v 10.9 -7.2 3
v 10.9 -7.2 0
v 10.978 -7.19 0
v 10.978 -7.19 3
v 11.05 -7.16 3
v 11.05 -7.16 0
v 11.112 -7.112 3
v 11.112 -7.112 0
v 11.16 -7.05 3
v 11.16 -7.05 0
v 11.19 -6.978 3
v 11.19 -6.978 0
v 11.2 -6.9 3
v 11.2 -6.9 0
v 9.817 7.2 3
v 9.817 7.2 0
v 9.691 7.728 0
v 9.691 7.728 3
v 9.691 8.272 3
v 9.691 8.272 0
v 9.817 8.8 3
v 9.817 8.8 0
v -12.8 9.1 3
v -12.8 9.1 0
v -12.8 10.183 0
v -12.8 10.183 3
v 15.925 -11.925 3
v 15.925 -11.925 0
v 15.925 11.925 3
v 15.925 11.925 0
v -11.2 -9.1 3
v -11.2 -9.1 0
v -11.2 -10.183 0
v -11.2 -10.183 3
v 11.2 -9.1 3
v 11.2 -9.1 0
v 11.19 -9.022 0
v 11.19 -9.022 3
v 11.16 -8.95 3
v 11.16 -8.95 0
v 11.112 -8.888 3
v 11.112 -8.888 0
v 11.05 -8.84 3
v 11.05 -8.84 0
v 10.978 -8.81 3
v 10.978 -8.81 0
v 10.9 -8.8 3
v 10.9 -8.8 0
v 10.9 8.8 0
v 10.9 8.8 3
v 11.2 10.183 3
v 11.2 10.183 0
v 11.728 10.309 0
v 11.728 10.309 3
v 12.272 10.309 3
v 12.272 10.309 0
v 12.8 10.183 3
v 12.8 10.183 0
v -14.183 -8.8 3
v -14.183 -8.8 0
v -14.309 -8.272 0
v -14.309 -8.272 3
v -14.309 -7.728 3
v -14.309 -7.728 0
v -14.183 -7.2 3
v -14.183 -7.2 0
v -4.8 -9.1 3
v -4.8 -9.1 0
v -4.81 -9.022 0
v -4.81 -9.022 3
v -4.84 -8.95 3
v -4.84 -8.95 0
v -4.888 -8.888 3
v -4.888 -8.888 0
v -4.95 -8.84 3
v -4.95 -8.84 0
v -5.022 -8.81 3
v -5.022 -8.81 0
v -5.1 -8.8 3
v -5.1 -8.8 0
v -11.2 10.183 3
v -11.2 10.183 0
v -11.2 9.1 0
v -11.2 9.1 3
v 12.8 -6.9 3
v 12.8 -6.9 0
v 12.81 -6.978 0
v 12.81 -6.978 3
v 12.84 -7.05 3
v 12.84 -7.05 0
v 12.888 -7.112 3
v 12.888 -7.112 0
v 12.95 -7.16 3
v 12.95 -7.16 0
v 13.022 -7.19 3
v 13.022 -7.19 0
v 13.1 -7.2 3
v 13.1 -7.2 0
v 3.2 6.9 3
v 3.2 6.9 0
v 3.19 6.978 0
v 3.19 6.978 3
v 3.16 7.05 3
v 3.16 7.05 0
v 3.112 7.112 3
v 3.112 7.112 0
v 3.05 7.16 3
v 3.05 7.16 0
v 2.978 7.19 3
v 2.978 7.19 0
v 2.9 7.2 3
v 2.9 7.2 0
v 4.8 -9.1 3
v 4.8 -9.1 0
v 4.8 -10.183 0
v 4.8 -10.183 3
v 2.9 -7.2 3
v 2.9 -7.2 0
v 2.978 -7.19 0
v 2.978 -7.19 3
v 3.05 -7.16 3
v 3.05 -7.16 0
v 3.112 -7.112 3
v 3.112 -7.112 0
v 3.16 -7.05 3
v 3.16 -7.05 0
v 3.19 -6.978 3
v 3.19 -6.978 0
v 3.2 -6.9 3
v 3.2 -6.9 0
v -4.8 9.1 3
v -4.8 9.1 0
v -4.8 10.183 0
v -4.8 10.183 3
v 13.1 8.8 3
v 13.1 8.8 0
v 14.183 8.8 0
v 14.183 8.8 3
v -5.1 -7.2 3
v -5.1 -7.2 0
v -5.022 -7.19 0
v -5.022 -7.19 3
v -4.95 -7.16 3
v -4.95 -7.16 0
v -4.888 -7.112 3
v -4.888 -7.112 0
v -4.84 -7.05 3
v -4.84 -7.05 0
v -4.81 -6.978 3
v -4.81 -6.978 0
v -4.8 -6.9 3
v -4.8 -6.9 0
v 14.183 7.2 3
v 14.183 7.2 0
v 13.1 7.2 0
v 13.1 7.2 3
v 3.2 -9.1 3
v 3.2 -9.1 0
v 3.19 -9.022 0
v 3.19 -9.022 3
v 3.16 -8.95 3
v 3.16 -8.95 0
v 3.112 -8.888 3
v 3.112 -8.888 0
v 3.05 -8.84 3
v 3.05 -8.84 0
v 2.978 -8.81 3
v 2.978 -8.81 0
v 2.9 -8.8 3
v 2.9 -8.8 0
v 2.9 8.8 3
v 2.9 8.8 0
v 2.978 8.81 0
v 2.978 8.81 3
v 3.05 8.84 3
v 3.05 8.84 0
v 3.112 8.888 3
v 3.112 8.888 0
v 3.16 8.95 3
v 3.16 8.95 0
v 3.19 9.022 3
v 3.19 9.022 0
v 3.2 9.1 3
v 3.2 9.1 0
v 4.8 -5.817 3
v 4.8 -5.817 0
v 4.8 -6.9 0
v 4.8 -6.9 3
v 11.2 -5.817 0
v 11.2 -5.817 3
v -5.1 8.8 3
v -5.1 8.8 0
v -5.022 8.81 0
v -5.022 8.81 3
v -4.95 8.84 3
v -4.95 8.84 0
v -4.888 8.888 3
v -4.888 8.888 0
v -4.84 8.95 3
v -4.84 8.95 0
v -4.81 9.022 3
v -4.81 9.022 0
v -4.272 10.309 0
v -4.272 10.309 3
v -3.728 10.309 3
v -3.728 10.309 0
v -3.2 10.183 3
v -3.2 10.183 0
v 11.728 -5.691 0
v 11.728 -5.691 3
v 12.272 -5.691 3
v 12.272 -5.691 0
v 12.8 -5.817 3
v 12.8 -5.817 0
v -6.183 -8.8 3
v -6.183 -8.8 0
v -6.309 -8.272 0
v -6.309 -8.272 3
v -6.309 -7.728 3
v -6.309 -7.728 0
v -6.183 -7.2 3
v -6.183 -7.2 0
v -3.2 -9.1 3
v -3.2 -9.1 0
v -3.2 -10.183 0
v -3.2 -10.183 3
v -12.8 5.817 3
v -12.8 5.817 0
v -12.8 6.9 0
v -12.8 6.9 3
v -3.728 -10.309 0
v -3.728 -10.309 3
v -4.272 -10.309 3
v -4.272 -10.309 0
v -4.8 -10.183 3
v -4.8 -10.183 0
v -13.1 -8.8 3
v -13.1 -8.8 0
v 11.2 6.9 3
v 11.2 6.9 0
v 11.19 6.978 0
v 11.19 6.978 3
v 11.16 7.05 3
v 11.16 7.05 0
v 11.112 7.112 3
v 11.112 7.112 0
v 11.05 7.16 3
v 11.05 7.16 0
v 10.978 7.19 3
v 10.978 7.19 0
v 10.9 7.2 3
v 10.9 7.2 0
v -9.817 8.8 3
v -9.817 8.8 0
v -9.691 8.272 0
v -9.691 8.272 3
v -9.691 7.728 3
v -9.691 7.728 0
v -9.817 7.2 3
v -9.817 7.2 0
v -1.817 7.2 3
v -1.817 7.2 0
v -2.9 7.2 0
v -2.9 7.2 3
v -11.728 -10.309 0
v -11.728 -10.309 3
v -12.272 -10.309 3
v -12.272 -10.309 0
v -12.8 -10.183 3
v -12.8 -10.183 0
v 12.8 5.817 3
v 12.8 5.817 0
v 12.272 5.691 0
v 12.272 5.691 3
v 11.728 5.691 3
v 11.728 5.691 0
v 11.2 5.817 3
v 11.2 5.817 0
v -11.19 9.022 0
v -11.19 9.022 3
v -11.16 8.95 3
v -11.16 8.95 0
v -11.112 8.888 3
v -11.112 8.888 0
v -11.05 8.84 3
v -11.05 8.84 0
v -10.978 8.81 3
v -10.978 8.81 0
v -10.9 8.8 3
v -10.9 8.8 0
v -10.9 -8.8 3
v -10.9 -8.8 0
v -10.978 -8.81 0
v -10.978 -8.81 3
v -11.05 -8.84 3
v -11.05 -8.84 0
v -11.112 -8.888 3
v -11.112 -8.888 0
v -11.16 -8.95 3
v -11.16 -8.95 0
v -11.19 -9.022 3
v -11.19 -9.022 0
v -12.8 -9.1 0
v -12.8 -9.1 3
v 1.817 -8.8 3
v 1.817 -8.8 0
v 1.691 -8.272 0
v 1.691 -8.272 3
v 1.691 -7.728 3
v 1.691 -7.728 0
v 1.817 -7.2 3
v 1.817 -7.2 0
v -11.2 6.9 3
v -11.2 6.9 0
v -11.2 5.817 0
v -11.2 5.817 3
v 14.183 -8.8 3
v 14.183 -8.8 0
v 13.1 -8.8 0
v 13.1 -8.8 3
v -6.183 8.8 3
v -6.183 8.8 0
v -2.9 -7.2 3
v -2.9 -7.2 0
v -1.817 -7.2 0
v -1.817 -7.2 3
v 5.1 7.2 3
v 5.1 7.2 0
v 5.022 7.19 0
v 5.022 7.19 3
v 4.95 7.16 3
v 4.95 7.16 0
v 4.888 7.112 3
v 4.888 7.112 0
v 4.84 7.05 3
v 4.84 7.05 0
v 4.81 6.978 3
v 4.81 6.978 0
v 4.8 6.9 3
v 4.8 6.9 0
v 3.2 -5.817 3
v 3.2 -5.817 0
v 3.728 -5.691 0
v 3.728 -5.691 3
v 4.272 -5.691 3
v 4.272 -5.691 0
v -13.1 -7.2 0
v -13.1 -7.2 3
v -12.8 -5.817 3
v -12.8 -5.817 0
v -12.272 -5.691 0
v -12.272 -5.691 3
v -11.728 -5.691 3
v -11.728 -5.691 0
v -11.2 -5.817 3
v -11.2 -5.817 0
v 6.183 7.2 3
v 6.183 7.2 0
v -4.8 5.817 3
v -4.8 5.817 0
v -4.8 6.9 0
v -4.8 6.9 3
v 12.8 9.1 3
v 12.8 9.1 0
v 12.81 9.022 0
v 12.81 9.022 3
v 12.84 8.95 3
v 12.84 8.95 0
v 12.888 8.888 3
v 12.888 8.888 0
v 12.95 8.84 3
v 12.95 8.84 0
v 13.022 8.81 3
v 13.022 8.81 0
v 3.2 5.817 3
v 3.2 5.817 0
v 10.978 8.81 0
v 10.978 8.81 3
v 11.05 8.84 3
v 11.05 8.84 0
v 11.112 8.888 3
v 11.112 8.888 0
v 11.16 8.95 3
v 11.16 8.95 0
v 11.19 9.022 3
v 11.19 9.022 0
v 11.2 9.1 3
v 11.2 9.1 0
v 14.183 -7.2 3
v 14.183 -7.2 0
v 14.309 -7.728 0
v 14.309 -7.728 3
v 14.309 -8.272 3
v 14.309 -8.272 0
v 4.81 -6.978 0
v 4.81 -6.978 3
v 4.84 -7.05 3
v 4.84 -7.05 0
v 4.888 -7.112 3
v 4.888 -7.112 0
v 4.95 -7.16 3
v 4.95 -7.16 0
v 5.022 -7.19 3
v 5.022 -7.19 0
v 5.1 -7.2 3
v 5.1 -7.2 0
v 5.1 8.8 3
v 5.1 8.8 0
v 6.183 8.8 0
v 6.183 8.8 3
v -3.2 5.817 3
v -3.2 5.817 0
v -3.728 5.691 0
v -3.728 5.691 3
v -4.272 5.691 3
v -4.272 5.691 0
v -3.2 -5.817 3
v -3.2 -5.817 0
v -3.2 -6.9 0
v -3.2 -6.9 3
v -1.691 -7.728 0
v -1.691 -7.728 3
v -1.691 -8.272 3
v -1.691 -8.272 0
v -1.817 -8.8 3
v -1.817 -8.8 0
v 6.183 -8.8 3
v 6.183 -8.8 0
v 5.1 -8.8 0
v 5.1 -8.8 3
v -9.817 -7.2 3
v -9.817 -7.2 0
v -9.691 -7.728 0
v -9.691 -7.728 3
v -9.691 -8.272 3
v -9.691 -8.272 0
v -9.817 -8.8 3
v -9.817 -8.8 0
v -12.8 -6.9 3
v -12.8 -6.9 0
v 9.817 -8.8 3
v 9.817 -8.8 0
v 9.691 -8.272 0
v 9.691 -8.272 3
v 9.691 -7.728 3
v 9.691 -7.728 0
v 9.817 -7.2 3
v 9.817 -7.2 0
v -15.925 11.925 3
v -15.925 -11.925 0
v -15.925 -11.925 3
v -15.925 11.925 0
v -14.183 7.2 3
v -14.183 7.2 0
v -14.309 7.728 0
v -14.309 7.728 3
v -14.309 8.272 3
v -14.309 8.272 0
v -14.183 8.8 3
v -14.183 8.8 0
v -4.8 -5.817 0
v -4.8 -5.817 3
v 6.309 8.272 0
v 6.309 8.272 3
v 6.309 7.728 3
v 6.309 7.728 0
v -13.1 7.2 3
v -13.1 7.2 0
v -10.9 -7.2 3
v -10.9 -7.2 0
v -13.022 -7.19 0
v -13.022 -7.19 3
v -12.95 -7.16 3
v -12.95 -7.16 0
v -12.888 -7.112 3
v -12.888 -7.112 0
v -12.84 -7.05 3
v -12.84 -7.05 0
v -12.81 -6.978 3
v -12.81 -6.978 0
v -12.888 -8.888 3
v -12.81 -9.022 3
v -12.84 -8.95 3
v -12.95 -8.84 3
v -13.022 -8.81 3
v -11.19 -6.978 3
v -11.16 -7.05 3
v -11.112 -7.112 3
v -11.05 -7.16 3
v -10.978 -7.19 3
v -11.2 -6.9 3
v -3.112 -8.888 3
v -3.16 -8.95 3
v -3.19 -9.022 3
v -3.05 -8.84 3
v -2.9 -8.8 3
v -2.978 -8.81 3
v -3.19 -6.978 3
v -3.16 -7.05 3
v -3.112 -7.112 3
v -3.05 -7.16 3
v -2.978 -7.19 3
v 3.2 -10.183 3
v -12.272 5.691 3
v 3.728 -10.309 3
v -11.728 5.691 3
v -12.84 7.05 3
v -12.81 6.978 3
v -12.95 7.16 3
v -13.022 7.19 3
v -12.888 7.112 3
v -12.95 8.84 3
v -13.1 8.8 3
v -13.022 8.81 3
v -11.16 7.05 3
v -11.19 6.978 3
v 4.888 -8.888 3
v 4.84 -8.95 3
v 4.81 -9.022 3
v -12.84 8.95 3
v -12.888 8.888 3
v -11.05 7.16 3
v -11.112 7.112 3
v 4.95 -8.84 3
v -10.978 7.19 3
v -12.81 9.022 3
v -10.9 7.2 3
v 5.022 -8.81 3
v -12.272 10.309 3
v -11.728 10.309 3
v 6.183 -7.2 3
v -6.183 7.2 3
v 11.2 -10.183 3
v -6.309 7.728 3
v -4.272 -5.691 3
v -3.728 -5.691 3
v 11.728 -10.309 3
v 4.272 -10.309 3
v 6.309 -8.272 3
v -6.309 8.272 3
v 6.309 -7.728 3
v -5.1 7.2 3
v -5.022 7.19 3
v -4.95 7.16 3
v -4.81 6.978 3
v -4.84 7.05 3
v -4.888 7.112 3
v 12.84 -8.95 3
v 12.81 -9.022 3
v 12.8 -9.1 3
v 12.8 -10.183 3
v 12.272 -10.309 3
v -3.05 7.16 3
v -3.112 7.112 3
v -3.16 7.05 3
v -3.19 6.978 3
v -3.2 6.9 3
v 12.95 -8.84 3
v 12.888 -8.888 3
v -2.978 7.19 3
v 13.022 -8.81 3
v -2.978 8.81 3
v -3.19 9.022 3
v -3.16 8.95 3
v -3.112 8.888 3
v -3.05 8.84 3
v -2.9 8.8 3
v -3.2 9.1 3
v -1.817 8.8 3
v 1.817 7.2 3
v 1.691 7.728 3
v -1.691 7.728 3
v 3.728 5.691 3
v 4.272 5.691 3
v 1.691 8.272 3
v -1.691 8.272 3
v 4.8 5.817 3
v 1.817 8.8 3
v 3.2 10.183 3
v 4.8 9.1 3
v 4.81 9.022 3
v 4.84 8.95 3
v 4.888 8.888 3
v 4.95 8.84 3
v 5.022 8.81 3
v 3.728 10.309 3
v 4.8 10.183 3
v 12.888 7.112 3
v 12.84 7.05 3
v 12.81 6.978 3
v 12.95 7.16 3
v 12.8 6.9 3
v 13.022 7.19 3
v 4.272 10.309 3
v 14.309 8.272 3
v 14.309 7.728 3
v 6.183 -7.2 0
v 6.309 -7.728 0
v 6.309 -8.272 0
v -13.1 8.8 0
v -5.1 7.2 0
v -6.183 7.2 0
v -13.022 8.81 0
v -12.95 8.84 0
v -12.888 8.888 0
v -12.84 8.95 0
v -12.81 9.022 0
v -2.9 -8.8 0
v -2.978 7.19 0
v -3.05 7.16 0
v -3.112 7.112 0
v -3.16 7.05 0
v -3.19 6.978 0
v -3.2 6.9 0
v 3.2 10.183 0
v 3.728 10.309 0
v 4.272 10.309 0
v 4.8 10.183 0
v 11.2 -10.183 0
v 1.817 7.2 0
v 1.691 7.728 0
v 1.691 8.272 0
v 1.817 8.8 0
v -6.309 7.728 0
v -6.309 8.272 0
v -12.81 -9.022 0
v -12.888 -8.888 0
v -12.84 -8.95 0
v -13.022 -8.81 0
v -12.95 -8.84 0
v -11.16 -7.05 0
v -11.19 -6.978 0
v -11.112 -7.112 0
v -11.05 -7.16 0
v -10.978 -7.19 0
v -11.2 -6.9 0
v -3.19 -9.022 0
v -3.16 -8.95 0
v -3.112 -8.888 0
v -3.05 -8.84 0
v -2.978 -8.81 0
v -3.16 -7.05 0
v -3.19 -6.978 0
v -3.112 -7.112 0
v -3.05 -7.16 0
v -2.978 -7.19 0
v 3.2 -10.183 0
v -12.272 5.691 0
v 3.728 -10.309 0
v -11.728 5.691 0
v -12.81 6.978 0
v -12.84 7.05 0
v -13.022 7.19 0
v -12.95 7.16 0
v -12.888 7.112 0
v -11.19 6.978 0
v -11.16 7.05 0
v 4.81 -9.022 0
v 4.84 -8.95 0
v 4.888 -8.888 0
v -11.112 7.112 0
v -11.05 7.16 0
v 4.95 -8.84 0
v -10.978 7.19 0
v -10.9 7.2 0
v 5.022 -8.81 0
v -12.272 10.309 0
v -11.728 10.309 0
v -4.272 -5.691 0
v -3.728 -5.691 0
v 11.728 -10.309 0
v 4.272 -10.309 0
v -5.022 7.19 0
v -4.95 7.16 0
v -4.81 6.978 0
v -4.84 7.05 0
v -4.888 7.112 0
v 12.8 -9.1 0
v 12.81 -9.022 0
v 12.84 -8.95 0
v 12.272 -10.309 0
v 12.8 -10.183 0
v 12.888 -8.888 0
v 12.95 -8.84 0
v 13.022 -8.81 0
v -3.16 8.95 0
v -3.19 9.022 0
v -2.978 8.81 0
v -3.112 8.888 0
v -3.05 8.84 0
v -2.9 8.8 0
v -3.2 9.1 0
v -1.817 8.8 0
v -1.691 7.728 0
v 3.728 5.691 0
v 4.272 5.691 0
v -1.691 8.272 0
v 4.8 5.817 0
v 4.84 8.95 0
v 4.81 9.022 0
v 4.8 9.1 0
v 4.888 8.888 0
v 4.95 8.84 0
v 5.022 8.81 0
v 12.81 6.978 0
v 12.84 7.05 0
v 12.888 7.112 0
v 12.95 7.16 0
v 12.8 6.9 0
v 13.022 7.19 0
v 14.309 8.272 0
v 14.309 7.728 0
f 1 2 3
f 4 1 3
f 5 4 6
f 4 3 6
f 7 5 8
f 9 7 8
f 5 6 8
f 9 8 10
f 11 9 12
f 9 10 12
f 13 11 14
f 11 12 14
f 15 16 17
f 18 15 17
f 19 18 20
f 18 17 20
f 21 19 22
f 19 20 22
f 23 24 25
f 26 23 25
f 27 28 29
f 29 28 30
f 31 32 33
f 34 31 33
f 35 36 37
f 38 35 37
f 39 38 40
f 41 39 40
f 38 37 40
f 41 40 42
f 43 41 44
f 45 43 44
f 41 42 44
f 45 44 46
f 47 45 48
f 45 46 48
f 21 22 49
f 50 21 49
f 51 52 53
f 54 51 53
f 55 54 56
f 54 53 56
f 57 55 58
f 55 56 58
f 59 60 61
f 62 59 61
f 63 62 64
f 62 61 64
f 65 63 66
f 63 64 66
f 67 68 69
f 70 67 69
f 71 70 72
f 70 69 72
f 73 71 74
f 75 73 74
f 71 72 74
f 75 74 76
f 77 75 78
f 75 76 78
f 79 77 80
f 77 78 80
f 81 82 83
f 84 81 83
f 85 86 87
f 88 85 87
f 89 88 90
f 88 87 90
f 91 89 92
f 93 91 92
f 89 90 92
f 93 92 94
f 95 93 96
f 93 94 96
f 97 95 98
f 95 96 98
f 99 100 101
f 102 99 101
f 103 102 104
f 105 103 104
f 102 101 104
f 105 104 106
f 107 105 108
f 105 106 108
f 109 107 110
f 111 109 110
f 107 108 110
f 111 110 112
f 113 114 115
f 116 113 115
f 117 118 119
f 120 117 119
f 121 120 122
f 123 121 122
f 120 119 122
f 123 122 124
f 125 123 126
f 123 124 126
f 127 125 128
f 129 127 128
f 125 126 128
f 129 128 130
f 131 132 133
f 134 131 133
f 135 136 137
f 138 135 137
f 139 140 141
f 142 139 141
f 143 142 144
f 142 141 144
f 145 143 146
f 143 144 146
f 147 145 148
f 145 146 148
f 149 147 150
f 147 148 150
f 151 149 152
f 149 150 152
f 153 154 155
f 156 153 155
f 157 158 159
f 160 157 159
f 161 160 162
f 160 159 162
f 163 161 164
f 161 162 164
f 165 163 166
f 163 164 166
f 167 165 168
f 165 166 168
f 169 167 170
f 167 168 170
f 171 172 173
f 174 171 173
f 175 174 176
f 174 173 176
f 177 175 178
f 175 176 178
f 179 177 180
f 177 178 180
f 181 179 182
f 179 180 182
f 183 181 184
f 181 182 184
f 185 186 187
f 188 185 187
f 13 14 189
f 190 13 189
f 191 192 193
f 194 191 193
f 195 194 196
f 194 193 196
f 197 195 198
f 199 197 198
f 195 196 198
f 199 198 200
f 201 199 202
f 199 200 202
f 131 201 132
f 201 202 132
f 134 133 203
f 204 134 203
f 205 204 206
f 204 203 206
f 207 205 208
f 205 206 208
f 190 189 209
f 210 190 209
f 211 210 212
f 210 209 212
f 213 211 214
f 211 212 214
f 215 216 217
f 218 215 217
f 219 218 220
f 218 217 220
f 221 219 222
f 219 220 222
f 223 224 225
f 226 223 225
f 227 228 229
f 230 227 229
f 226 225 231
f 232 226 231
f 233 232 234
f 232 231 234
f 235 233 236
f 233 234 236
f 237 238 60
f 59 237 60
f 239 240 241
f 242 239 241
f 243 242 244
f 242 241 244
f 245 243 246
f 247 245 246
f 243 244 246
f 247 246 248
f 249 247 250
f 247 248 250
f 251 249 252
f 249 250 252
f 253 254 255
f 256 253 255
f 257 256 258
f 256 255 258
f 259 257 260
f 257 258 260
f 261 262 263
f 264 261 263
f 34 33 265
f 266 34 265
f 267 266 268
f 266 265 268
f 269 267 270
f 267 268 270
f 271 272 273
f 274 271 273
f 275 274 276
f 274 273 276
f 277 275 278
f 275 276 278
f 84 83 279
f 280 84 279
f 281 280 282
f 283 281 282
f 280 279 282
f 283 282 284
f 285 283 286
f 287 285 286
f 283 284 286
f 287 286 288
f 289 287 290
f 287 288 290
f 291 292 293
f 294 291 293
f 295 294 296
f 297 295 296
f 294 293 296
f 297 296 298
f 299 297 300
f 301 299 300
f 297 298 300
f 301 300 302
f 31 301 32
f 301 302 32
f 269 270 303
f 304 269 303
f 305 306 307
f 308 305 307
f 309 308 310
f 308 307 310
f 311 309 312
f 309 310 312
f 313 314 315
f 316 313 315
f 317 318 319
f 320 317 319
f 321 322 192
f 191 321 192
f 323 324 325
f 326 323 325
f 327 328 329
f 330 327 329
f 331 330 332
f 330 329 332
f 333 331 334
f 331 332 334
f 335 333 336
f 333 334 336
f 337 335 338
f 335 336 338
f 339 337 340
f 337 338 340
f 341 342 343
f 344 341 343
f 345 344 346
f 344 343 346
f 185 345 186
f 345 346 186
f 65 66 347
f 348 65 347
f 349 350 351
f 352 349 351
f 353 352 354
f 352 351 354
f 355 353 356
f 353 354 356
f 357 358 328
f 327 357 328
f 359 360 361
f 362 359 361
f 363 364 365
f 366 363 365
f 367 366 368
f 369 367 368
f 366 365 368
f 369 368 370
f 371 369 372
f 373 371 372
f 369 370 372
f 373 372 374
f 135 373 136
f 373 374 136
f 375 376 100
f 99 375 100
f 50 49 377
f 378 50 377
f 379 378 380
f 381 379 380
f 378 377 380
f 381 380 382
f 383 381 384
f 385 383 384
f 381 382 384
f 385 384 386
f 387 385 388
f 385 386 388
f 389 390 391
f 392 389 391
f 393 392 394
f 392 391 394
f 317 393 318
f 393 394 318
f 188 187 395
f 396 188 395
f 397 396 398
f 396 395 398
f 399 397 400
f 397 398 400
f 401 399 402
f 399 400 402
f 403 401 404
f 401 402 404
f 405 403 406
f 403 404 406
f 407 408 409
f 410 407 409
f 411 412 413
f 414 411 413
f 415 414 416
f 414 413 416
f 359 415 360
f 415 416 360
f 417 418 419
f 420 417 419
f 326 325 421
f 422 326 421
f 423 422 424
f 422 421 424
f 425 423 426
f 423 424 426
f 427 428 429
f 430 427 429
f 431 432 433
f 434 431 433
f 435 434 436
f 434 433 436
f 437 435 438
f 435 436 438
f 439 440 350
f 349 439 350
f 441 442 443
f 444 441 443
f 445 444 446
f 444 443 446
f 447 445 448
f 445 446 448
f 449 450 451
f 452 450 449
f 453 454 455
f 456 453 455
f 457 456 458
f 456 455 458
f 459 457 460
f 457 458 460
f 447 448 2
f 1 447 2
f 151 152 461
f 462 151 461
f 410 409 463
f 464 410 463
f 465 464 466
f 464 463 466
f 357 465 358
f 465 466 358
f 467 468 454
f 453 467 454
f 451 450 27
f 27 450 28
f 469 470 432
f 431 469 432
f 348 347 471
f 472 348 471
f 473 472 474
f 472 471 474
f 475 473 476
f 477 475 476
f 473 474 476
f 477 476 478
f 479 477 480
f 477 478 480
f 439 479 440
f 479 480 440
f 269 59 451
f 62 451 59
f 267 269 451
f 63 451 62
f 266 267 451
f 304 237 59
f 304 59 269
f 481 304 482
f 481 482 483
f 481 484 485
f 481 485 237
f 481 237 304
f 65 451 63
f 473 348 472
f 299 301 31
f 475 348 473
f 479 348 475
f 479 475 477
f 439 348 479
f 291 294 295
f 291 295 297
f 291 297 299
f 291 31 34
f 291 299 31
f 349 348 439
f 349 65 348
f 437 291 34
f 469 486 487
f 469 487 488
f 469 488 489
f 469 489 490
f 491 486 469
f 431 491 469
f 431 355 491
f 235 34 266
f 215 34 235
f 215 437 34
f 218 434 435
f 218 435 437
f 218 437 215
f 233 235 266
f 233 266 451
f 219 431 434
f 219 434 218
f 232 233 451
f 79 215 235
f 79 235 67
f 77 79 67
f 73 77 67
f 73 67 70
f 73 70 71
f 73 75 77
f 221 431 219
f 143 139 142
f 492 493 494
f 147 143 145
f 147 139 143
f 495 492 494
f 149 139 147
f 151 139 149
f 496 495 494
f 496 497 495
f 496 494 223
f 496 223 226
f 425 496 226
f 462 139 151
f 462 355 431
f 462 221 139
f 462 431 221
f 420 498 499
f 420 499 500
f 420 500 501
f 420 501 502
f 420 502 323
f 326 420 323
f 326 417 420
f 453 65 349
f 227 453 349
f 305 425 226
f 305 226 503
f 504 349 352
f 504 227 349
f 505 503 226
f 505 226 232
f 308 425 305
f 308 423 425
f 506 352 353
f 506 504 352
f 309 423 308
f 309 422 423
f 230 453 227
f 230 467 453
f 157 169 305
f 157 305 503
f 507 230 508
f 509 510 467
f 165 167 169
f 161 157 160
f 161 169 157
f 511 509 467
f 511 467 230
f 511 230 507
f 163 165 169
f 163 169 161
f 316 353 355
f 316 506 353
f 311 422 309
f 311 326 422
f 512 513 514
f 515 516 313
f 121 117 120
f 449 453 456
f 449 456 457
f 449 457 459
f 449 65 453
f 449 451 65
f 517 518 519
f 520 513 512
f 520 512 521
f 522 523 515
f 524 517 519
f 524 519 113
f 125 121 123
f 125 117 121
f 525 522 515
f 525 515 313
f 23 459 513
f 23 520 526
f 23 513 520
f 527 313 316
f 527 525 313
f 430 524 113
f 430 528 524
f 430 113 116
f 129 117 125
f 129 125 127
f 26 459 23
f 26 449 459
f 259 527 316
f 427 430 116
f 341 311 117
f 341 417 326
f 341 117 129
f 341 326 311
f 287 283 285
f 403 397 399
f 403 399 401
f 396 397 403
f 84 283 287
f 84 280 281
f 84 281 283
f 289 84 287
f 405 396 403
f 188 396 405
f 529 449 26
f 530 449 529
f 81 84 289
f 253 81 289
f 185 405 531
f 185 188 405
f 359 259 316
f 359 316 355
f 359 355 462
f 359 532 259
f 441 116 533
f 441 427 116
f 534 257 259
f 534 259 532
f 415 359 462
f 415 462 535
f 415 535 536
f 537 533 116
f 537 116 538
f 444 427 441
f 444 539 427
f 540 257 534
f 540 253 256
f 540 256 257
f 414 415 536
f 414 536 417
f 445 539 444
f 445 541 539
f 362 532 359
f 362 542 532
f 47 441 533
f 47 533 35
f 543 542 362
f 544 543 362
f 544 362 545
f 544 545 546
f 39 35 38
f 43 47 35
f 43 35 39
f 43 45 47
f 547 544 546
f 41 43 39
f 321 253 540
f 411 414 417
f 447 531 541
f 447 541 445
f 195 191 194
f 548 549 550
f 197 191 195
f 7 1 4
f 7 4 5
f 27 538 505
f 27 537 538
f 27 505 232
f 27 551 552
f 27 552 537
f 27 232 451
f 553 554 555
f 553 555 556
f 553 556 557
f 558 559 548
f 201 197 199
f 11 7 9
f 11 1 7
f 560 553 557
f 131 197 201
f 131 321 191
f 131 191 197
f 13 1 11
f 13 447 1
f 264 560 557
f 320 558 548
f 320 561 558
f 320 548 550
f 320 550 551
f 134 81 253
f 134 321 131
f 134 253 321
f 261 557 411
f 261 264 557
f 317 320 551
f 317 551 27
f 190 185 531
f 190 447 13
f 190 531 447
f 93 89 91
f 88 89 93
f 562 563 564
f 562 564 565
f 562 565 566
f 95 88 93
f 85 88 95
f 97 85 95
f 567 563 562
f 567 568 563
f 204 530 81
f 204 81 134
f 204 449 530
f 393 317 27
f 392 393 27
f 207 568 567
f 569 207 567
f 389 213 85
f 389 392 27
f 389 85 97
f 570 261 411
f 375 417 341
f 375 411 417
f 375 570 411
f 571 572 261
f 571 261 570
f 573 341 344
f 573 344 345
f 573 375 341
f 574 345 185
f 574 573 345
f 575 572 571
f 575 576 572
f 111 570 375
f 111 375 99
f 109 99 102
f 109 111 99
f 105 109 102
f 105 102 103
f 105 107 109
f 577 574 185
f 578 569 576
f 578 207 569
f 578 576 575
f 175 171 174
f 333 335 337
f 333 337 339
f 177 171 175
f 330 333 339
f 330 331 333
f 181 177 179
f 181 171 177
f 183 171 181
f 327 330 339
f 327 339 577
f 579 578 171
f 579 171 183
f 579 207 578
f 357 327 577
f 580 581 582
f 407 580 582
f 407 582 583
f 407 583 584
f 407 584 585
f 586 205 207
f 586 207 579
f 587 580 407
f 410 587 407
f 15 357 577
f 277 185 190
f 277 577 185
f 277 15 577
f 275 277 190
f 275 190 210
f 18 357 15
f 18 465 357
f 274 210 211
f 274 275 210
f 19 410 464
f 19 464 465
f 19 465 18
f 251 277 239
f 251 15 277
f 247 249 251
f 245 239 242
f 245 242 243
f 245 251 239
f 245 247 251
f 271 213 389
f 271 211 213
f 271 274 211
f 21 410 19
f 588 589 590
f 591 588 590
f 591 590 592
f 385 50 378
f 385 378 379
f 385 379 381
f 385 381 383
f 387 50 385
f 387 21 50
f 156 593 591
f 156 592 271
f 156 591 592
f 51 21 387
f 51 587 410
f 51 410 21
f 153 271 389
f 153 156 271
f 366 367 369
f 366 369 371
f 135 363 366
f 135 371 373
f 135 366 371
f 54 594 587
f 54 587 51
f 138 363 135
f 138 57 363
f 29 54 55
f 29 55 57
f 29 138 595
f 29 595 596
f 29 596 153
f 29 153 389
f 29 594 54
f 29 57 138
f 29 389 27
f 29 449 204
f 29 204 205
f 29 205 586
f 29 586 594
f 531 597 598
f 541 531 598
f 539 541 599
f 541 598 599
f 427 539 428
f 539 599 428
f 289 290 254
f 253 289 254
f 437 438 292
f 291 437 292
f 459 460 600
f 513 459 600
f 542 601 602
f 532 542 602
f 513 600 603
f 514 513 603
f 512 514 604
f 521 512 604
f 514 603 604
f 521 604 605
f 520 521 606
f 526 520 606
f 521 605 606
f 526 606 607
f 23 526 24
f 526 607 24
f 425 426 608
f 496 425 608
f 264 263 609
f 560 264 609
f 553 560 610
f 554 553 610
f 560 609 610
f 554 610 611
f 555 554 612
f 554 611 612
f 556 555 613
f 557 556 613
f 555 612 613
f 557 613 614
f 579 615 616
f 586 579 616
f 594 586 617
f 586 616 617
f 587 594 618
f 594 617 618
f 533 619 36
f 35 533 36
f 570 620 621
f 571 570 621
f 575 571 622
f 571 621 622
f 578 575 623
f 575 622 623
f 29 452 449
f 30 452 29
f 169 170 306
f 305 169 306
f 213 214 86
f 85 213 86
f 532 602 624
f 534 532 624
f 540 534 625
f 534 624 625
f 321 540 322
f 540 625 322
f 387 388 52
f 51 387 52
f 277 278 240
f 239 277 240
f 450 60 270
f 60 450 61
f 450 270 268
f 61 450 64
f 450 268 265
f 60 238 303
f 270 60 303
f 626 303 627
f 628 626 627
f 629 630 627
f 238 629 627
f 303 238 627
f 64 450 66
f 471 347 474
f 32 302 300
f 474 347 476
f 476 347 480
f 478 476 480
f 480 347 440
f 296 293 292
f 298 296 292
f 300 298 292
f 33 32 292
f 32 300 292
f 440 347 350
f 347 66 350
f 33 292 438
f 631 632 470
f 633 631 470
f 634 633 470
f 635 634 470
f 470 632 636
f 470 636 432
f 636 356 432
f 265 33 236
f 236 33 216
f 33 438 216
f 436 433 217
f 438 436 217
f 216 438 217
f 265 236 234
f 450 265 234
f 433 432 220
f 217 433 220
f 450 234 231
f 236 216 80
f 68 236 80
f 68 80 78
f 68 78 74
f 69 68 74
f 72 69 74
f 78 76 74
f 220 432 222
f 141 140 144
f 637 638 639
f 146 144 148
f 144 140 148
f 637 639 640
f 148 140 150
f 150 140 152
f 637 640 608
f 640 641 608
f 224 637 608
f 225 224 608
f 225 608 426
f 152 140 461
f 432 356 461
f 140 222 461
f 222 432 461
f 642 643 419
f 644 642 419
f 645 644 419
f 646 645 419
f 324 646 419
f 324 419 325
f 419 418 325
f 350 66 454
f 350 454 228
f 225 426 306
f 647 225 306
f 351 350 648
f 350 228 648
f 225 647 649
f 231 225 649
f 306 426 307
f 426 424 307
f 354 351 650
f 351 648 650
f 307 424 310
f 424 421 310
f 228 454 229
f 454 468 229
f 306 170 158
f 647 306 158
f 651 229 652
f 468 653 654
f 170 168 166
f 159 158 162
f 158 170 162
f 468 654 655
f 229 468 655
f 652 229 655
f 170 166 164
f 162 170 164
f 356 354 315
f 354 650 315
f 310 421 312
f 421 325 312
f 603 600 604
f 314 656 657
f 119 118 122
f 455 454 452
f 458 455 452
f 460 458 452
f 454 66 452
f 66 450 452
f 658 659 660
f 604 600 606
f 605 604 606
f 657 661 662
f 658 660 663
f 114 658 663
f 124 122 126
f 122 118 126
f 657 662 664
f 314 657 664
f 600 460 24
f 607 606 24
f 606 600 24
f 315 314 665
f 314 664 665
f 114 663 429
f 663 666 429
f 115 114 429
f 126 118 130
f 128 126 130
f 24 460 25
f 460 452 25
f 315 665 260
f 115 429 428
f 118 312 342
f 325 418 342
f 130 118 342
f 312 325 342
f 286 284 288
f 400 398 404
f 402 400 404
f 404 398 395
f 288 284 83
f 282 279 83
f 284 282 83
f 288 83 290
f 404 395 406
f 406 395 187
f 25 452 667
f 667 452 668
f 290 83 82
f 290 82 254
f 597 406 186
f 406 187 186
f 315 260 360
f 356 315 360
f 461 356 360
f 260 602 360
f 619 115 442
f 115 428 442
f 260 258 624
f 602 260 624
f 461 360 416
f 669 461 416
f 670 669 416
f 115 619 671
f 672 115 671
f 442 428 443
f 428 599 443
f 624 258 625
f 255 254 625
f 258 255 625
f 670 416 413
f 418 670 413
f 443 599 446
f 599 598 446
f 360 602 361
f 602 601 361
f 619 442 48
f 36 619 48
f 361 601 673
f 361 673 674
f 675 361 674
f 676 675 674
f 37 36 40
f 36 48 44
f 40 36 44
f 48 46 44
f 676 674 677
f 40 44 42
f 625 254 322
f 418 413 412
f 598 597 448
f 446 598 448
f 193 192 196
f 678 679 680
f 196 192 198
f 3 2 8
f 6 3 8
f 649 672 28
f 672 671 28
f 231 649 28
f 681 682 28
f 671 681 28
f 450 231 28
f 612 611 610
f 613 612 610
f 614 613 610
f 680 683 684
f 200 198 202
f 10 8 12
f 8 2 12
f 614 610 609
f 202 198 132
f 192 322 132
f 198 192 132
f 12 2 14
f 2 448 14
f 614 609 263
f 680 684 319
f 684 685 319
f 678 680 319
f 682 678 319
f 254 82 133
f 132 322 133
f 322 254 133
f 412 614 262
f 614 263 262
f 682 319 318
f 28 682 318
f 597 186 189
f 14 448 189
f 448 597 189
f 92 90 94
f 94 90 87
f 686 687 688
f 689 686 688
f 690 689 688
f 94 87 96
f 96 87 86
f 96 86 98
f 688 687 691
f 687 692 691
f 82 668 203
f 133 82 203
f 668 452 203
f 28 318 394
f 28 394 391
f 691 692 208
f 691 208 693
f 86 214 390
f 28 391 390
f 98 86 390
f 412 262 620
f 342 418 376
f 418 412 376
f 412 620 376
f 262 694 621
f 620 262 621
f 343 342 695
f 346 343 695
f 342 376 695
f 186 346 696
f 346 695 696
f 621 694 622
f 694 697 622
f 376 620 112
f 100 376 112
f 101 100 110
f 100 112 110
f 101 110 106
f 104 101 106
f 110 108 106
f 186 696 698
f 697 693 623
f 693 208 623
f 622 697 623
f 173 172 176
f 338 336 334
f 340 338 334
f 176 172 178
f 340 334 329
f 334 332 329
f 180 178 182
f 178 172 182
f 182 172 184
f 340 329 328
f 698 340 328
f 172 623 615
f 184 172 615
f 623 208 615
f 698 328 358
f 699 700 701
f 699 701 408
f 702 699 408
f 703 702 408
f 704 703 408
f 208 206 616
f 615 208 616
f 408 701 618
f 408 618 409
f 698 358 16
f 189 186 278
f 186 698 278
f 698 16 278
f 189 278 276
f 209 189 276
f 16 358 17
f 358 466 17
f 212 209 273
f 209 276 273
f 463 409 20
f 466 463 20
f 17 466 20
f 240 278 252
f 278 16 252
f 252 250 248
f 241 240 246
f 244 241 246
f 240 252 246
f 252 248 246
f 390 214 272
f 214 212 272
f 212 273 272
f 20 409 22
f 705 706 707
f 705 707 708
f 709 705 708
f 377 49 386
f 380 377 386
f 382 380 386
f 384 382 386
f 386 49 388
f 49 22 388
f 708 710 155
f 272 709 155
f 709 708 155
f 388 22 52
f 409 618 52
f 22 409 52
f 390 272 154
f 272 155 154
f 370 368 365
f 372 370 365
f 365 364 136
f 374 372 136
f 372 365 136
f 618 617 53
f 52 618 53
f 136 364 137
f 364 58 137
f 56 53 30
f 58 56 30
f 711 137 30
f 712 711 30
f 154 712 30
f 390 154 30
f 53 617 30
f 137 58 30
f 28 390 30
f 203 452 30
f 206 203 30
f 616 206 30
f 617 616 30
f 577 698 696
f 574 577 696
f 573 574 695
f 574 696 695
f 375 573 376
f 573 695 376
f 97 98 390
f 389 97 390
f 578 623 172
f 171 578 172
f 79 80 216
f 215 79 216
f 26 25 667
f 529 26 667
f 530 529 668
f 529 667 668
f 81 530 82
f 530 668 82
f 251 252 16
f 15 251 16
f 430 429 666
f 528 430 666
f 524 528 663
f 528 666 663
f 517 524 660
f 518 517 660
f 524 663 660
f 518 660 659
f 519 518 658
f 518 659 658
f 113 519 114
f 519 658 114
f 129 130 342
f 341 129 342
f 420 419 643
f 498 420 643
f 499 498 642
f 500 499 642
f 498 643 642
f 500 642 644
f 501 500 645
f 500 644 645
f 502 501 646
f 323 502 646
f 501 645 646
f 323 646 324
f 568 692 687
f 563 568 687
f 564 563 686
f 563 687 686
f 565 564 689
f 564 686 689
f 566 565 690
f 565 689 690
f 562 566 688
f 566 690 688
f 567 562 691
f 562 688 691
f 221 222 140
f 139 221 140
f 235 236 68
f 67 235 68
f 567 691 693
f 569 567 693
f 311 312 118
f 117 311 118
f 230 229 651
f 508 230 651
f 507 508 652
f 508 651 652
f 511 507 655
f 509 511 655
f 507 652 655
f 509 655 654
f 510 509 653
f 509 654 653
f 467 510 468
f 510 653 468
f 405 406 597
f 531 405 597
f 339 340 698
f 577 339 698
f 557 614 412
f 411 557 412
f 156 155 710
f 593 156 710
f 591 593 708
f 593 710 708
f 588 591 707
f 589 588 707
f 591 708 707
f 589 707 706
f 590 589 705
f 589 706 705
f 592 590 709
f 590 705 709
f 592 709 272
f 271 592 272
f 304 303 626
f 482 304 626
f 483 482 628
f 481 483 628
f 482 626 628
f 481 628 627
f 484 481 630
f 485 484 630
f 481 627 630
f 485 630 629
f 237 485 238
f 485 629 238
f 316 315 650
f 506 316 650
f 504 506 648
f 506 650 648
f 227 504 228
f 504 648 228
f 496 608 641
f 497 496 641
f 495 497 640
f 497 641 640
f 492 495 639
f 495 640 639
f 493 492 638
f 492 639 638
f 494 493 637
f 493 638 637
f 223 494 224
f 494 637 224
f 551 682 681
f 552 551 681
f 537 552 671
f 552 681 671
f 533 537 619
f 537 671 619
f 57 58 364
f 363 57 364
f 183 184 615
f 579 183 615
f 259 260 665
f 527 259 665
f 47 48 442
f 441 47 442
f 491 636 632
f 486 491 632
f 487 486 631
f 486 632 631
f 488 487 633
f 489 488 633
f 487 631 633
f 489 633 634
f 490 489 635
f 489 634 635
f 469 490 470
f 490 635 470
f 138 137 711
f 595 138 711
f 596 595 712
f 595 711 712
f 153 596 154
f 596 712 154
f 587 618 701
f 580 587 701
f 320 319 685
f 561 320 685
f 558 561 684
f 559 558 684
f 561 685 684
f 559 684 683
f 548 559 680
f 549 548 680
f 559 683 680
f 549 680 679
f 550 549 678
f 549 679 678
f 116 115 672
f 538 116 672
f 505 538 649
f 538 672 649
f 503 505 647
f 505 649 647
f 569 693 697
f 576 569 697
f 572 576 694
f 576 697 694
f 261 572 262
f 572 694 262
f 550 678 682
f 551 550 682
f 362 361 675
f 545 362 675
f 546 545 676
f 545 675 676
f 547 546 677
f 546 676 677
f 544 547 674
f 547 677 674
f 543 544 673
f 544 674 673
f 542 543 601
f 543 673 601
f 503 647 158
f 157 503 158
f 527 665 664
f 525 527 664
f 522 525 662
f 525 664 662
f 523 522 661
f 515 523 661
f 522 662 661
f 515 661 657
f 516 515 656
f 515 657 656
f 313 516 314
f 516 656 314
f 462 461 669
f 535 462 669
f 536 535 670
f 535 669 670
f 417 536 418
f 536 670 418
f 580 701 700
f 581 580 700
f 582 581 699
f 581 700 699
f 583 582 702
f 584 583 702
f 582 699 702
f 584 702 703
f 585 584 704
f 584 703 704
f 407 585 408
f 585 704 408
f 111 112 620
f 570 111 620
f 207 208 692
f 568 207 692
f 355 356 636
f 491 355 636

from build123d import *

# Parameters (mm, degrees)
F0_W     = 31.85
F0_H     = 23.85
F1_DEPTH = 3


with BuildPart() as f1:
    # F0 (on Top) → F1 (new body)
    with BuildSketch(Plane.XY):
        Rectangle(F0_W, F0_H)
        with BuildLine():
            Line((-11.2, -9.1), (-11.2, -10.183031))
            ThreePointArc((-11.2, -10.183031), (-12, -10.325), (-12.8, -10.183031))
            Line((-12.8, -10.183031), (-12.8, -9.1))
            ThreePointArc((-12.8, -9.1), (-12.887868, -8.887868), (-13.1, -8.8))
            Line((-13.1, -8.8), (-14.183031, -8.8))
            ThreePointArc((-14.183031, -8.8), (-14.325, -8), (-14.183031, -7.2))
            Line((-14.183031, -7.2), (-13.1, -7.2))
            ThreePointArc((-13.1, -7.2), (-12.887868, -7.112132), (-12.8, -6.9))
            Line((-12.8, -6.9), (-12.8, -5.816969))
            ThreePointArc((-12.8, -5.816969), (-12, -5.675), (-11.2, -5.816969))
            Line((-11.2, -5.816969), (-11.2, -6.9))
            ThreePointArc((-11.2, -6.9), (-11.112132, -7.112132), (-10.9, -7.2))
            Line((-10.9, -7.2), (-9.816969, -7.2))
            ThreePointArc((-9.816969, -7.2), (-9.675, -8), (-9.816969, -8.8))
            Line((-9.816969, -8.8), (-10.9, -8.8))
            ThreePointArc((-10.9, -8.8), (-11.112132, -8.887868), (-11.2, -9.1))
        make_face(mode=Mode.SUBTRACT)
        with BuildLine():
            ThreePointArc((-5.1, -7.2), (-4.887868, -7.112132), (-4.8, -6.9))
            Line((-4.8, -6.9), (-4.8, -5.816969))
            ThreePointArc((-4.8, -5.816969), (-4, -5.675), (-3.2, -5.816969))
            Line((-3.2, -5.816969), (-3.2, -6.9))
            ThreePointArc((-3.2, -6.9), (-3.112132, -7.112132), (-2.9, -7.2))
            Line((-2.9, -7.2), (-1.816969, -7.2))
            ThreePointArc((-1.816969, -7.2), (-1.675, -8), (-1.816969, -8.8))
            Line((-1.816969, -8.8), (-2.9, -8.8))
            ThreePointArc((-2.9, -8.8), (-3.112132, -8.887868), (-3.2, -9.1))
            Line((-3.2, -9.1), (-3.2, -10.183031))
            ThreePointArc((-3.2, -10.183031), (-4, -10.325), (-4.8, -10.183031))
            Line((-4.8, -10.183031), (-4.8, -9.1))
            ThreePointArc((-4.8, -9.1), (-4.887868, -8.887868), (-5.1, -8.8))
            Line((-5.1, -8.8), (-6.183031, -8.8))
            ThreePointArc((-6.183031, -8.8), (-6.325, -8), (-6.183031, -7.2))
            Line((-6.183031, -7.2), (-5.1, -7.2))
        make_face(mode=Mode.SUBTRACT)
        with BuildLine():
            Line((4.8, -9.1), (4.8, -10.183031))
            ThreePointArc((4.8, -10.183031), (4, -10.325), (3.2, -10.183031))
            Line((3.2, -10.183031), (3.2, -9.1))
            ThreePointArc((3.2, -9.1), (3.112132, -8.887868), (2.9, -8.8))
            Line((2.9, -8.8), (1.816969, -8.8))
            ThreePointArc((1.816969, -8.8), (1.675, -8), (1.816969, -7.2))
            Line((1.816969, -7.2), (2.9, -7.2))
            ThreePointArc((2.9, -7.2), (3.112132, -7.112132), (3.2, -6.9))
            Line((3.2, -6.9), (3.2, -5.816969))
            ThreePointArc((3.2, -5.816969), (4, -5.675), (4.8, -5.816969))
            Line((4.8, -5.816969), (4.8, -6.9))
            ThreePointArc((4.8, -6.9), (4.887868, -7.112132), (5.1, -7.2))
            Line((5.1, -7.2), (6.183031, -7.2))
            ThreePointArc((6.183031, -7.2), (6.325, -8), (6.183031, -8.8))
            Line((6.183031, -8.8), (5.1, -8.8))
            ThreePointArc((5.1, -8.8), (4.887868, -8.887868), (4.8, -9.1))
        make_face(mode=Mode.SUBTRACT)
        with BuildLine():
            ThreePointArc((12.8, -6.9), (12.887868, -7.112132), (13.1, -7.2))
            Line((13.1, -7.2), (14.183031, -7.2))
            ThreePointArc((14.183031, -7.2), (14.325, -8), (14.183031, -8.8))
            Line((14.183031, -8.8), (13.1, -8.8))
            ThreePointArc((13.1, -8.8), (12.887868, -8.887868), (12.8, -9.1))
            Line((12.8, -9.1), (12.8, -10.183031))
            ThreePointArc((12.8, -10.183031), (12, -10.325), (11.2, -10.183031))
            Line((11.2, -10.183031), (11.2, -9.1))
            ThreePointArc((11.2, -9.1), (11.112132, -8.887868), (10.9, -8.8))
            Line((10.9, -8.8), (9.816969, -8.8))
            ThreePointArc((9.816969, -8.8), (9.675, -8), (9.816969, -7.2))
            Line((9.816969, -7.2), (10.9, -7.2))
            ThreePointArc((10.9, -7.2), (11.112132, -7.112132), (11.2, -6.9))
            Line((11.2, -6.9), (11.2, -5.816969))
            ThreePointArc((11.2, -5.816969), (12, -5.675), (12.8, -5.816969))
            Line((12.8, -5.816969), (12.8, -6.9))
        make_face(mode=Mode.SUBTRACT)
        with BuildLine():
            ThreePointArc((-12.8, 10.183031), (-12, 10.325), (-11.2, 10.183031))
            Line((-11.2, 10.183031), (-11.2, 9.1))
            ThreePointArc((-11.2, 9.1), (-11.112132, 8.887868), (-10.9, 8.8))
            Line((-10.9, 8.8), (-9.816969, 8.8))
            ThreePointArc((-9.816969, 8.8), (-9.675, 8), (-9.816969, 7.2))
            Line((-9.816969, 7.2), (-10.9, 7.2))
            ThreePointArc((-10.9, 7.2), (-11.112132, 7.112132), (-11.2, 6.9))
            Line((-11.2, 6.9), (-11.2, 5.816969))
            ThreePointArc((-11.2, 5.816969), (-12, 5.675), (-12.8, 5.816969))
            Line((-12.8, 5.816969), (-12.8, 6.9))
            ThreePointArc((-12.8, 6.9), (-12.887868, 7.112132), (-13.1, 7.2))
            Line((-13.1, 7.2), (-14.183031, 7.2))
            ThreePointArc((-14.183031, 7.2), (-14.325, 8), (-14.183031, 8.8))
            Line((-14.183031, 8.8), (-13.1, 8.8))
            ThreePointArc((-13.1, 8.8), (-12.887868, 8.887868), (-12.8, 9.1))
            Line((-12.8, 9.1), (-12.8, 10.183031))
        make_face(mode=Mode.SUBTRACT)
        with BuildLine():
            ThreePointArc((-4.8, 10.183031), (-4, 10.325), (-3.2, 10.183031))
            Line((-3.2, 10.183031), (-3.2, 9.1))
            ThreePointArc((-3.2, 9.1), (-3.112132, 8.887868), (-2.9, 8.8))
            Line((-2.9, 8.8), (-1.816969, 8.8))
            ThreePointArc((-1.816969, 8.8), (-1.675, 8), (-1.816969, 7.2))
            Line((-1.816969, 7.2), (-2.9, 7.2))
            ThreePointArc((-2.9, 7.2), (-3.112132, 7.112132), (-3.2, 6.9))
            Line((-3.2, 6.9), (-3.2, 5.816969))
            ThreePointArc((-3.2, 5.816969), (-4, 5.675), (-4.8, 5.816969))
            Line((-4.8, 5.816969), (-4.8, 6.9))
            ThreePointArc((-4.8, 6.9), (-4.887868, 7.112132), (-5.1, 7.2))
            Line((-5.1, 7.2), (-6.183031, 7.2))
            ThreePointArc((-6.183031, 7.2), (-6.325, 8), (-6.183031, 8.8))
            Line((-6.183031, 8.8), (-5.1, 8.8))
            ThreePointArc((-5.1, 8.8), (-4.887868, 8.887868), (-4.8, 9.1))
            Line((-4.8, 9.1), (-4.8, 10.183031))
        make_face(mode=Mode.SUBTRACT)
        with BuildLine():
            ThreePointArc((3.2, 10.183031), (4, 10.325), (4.8, 10.183031))
            Line((4.8, 10.183031), (4.8, 9.1))
            ThreePointArc((4.8, 9.1), (4.887868, 8.887868), (5.1, 8.8))
            Line((5.1, 8.8), (6.183031, 8.8))
            ThreePointArc((6.183031, 8.8), (6.325, 8), (6.183031, 7.2))
            Line((6.183031, 7.2), (5.1, 7.2))
            ThreePointArc((5.1, 7.2), (4.887868, 7.112132), (4.8, 6.9))
            Line((4.8, 6.9), (4.8, 5.816969))
            ThreePointArc((4.8, 5.816969), (4, 5.675), (3.2, 5.816969))
            Line((3.2, 5.816969), (3.2, 6.9))
            ThreePointArc((3.2, 6.9), (3.112132, 7.112132), (2.9, 7.2))
            Line((2.9, 7.2), (1.816969, 7.2))
            ThreePointArc((1.816969, 7.2), (1.675, 8), (1.816969, 8.8))
            Line((1.816969, 8.8), (2.9, 8.8))
            ThreePointArc((2.9, 8.8), (3.112132, 8.887868), (3.2, 9.1))
            Line((3.2, 9.1), (3.2, 10.183031))
        make_face(mode=Mode.SUBTRACT)
        with BuildLine():
            ThreePointArc((11.2, 10.183031), (12, 10.325), (12.8, 10.183031))
            Line((12.8, 10.183031), (12.8, 9.1))
            ThreePointArc((12.8, 9.1), (12.887868, 8.887868), (13.1, 8.8))
            Line((13.1, 8.8), (14.183031, 8.8))
            ThreePointArc((14.183031, 8.8), (14.325, 8), (14.183031, 7.2))
            Line((14.183031, 7.2), (13.1, 7.2))
            ThreePointArc((13.1, 7.2), (12.887868, 7.112132), (12.8, 6.9))
            Line((12.8, 6.9), (12.8, 5.816969))
            ThreePointArc((12.8, 5.816969), (12, 5.675), (11.2, 5.816969))
            Line((11.2, 5.816969), (11.2, 6.9))
            ThreePointArc((11.2, 6.9), (11.112132, 7.112132), (10.9, 7.2))
            Line((10.9, 7.2), (9.816969, 7.2))
            ThreePointArc((9.816969, 7.2), (9.675, 8), (9.816969, 8.8))
            Line((9.816969, 8.8), (10.9, 8.8))
            ThreePointArc((10.9, 8.8), (11.112132, 8.887868), (11.2, 9.1))
            Line((11.2, 9.1), (11.2, 10.183031))
        make_face(mode=Mode.SUBTRACT)
    extrude(amount=F1_DEPTH)


solid = f1.part
